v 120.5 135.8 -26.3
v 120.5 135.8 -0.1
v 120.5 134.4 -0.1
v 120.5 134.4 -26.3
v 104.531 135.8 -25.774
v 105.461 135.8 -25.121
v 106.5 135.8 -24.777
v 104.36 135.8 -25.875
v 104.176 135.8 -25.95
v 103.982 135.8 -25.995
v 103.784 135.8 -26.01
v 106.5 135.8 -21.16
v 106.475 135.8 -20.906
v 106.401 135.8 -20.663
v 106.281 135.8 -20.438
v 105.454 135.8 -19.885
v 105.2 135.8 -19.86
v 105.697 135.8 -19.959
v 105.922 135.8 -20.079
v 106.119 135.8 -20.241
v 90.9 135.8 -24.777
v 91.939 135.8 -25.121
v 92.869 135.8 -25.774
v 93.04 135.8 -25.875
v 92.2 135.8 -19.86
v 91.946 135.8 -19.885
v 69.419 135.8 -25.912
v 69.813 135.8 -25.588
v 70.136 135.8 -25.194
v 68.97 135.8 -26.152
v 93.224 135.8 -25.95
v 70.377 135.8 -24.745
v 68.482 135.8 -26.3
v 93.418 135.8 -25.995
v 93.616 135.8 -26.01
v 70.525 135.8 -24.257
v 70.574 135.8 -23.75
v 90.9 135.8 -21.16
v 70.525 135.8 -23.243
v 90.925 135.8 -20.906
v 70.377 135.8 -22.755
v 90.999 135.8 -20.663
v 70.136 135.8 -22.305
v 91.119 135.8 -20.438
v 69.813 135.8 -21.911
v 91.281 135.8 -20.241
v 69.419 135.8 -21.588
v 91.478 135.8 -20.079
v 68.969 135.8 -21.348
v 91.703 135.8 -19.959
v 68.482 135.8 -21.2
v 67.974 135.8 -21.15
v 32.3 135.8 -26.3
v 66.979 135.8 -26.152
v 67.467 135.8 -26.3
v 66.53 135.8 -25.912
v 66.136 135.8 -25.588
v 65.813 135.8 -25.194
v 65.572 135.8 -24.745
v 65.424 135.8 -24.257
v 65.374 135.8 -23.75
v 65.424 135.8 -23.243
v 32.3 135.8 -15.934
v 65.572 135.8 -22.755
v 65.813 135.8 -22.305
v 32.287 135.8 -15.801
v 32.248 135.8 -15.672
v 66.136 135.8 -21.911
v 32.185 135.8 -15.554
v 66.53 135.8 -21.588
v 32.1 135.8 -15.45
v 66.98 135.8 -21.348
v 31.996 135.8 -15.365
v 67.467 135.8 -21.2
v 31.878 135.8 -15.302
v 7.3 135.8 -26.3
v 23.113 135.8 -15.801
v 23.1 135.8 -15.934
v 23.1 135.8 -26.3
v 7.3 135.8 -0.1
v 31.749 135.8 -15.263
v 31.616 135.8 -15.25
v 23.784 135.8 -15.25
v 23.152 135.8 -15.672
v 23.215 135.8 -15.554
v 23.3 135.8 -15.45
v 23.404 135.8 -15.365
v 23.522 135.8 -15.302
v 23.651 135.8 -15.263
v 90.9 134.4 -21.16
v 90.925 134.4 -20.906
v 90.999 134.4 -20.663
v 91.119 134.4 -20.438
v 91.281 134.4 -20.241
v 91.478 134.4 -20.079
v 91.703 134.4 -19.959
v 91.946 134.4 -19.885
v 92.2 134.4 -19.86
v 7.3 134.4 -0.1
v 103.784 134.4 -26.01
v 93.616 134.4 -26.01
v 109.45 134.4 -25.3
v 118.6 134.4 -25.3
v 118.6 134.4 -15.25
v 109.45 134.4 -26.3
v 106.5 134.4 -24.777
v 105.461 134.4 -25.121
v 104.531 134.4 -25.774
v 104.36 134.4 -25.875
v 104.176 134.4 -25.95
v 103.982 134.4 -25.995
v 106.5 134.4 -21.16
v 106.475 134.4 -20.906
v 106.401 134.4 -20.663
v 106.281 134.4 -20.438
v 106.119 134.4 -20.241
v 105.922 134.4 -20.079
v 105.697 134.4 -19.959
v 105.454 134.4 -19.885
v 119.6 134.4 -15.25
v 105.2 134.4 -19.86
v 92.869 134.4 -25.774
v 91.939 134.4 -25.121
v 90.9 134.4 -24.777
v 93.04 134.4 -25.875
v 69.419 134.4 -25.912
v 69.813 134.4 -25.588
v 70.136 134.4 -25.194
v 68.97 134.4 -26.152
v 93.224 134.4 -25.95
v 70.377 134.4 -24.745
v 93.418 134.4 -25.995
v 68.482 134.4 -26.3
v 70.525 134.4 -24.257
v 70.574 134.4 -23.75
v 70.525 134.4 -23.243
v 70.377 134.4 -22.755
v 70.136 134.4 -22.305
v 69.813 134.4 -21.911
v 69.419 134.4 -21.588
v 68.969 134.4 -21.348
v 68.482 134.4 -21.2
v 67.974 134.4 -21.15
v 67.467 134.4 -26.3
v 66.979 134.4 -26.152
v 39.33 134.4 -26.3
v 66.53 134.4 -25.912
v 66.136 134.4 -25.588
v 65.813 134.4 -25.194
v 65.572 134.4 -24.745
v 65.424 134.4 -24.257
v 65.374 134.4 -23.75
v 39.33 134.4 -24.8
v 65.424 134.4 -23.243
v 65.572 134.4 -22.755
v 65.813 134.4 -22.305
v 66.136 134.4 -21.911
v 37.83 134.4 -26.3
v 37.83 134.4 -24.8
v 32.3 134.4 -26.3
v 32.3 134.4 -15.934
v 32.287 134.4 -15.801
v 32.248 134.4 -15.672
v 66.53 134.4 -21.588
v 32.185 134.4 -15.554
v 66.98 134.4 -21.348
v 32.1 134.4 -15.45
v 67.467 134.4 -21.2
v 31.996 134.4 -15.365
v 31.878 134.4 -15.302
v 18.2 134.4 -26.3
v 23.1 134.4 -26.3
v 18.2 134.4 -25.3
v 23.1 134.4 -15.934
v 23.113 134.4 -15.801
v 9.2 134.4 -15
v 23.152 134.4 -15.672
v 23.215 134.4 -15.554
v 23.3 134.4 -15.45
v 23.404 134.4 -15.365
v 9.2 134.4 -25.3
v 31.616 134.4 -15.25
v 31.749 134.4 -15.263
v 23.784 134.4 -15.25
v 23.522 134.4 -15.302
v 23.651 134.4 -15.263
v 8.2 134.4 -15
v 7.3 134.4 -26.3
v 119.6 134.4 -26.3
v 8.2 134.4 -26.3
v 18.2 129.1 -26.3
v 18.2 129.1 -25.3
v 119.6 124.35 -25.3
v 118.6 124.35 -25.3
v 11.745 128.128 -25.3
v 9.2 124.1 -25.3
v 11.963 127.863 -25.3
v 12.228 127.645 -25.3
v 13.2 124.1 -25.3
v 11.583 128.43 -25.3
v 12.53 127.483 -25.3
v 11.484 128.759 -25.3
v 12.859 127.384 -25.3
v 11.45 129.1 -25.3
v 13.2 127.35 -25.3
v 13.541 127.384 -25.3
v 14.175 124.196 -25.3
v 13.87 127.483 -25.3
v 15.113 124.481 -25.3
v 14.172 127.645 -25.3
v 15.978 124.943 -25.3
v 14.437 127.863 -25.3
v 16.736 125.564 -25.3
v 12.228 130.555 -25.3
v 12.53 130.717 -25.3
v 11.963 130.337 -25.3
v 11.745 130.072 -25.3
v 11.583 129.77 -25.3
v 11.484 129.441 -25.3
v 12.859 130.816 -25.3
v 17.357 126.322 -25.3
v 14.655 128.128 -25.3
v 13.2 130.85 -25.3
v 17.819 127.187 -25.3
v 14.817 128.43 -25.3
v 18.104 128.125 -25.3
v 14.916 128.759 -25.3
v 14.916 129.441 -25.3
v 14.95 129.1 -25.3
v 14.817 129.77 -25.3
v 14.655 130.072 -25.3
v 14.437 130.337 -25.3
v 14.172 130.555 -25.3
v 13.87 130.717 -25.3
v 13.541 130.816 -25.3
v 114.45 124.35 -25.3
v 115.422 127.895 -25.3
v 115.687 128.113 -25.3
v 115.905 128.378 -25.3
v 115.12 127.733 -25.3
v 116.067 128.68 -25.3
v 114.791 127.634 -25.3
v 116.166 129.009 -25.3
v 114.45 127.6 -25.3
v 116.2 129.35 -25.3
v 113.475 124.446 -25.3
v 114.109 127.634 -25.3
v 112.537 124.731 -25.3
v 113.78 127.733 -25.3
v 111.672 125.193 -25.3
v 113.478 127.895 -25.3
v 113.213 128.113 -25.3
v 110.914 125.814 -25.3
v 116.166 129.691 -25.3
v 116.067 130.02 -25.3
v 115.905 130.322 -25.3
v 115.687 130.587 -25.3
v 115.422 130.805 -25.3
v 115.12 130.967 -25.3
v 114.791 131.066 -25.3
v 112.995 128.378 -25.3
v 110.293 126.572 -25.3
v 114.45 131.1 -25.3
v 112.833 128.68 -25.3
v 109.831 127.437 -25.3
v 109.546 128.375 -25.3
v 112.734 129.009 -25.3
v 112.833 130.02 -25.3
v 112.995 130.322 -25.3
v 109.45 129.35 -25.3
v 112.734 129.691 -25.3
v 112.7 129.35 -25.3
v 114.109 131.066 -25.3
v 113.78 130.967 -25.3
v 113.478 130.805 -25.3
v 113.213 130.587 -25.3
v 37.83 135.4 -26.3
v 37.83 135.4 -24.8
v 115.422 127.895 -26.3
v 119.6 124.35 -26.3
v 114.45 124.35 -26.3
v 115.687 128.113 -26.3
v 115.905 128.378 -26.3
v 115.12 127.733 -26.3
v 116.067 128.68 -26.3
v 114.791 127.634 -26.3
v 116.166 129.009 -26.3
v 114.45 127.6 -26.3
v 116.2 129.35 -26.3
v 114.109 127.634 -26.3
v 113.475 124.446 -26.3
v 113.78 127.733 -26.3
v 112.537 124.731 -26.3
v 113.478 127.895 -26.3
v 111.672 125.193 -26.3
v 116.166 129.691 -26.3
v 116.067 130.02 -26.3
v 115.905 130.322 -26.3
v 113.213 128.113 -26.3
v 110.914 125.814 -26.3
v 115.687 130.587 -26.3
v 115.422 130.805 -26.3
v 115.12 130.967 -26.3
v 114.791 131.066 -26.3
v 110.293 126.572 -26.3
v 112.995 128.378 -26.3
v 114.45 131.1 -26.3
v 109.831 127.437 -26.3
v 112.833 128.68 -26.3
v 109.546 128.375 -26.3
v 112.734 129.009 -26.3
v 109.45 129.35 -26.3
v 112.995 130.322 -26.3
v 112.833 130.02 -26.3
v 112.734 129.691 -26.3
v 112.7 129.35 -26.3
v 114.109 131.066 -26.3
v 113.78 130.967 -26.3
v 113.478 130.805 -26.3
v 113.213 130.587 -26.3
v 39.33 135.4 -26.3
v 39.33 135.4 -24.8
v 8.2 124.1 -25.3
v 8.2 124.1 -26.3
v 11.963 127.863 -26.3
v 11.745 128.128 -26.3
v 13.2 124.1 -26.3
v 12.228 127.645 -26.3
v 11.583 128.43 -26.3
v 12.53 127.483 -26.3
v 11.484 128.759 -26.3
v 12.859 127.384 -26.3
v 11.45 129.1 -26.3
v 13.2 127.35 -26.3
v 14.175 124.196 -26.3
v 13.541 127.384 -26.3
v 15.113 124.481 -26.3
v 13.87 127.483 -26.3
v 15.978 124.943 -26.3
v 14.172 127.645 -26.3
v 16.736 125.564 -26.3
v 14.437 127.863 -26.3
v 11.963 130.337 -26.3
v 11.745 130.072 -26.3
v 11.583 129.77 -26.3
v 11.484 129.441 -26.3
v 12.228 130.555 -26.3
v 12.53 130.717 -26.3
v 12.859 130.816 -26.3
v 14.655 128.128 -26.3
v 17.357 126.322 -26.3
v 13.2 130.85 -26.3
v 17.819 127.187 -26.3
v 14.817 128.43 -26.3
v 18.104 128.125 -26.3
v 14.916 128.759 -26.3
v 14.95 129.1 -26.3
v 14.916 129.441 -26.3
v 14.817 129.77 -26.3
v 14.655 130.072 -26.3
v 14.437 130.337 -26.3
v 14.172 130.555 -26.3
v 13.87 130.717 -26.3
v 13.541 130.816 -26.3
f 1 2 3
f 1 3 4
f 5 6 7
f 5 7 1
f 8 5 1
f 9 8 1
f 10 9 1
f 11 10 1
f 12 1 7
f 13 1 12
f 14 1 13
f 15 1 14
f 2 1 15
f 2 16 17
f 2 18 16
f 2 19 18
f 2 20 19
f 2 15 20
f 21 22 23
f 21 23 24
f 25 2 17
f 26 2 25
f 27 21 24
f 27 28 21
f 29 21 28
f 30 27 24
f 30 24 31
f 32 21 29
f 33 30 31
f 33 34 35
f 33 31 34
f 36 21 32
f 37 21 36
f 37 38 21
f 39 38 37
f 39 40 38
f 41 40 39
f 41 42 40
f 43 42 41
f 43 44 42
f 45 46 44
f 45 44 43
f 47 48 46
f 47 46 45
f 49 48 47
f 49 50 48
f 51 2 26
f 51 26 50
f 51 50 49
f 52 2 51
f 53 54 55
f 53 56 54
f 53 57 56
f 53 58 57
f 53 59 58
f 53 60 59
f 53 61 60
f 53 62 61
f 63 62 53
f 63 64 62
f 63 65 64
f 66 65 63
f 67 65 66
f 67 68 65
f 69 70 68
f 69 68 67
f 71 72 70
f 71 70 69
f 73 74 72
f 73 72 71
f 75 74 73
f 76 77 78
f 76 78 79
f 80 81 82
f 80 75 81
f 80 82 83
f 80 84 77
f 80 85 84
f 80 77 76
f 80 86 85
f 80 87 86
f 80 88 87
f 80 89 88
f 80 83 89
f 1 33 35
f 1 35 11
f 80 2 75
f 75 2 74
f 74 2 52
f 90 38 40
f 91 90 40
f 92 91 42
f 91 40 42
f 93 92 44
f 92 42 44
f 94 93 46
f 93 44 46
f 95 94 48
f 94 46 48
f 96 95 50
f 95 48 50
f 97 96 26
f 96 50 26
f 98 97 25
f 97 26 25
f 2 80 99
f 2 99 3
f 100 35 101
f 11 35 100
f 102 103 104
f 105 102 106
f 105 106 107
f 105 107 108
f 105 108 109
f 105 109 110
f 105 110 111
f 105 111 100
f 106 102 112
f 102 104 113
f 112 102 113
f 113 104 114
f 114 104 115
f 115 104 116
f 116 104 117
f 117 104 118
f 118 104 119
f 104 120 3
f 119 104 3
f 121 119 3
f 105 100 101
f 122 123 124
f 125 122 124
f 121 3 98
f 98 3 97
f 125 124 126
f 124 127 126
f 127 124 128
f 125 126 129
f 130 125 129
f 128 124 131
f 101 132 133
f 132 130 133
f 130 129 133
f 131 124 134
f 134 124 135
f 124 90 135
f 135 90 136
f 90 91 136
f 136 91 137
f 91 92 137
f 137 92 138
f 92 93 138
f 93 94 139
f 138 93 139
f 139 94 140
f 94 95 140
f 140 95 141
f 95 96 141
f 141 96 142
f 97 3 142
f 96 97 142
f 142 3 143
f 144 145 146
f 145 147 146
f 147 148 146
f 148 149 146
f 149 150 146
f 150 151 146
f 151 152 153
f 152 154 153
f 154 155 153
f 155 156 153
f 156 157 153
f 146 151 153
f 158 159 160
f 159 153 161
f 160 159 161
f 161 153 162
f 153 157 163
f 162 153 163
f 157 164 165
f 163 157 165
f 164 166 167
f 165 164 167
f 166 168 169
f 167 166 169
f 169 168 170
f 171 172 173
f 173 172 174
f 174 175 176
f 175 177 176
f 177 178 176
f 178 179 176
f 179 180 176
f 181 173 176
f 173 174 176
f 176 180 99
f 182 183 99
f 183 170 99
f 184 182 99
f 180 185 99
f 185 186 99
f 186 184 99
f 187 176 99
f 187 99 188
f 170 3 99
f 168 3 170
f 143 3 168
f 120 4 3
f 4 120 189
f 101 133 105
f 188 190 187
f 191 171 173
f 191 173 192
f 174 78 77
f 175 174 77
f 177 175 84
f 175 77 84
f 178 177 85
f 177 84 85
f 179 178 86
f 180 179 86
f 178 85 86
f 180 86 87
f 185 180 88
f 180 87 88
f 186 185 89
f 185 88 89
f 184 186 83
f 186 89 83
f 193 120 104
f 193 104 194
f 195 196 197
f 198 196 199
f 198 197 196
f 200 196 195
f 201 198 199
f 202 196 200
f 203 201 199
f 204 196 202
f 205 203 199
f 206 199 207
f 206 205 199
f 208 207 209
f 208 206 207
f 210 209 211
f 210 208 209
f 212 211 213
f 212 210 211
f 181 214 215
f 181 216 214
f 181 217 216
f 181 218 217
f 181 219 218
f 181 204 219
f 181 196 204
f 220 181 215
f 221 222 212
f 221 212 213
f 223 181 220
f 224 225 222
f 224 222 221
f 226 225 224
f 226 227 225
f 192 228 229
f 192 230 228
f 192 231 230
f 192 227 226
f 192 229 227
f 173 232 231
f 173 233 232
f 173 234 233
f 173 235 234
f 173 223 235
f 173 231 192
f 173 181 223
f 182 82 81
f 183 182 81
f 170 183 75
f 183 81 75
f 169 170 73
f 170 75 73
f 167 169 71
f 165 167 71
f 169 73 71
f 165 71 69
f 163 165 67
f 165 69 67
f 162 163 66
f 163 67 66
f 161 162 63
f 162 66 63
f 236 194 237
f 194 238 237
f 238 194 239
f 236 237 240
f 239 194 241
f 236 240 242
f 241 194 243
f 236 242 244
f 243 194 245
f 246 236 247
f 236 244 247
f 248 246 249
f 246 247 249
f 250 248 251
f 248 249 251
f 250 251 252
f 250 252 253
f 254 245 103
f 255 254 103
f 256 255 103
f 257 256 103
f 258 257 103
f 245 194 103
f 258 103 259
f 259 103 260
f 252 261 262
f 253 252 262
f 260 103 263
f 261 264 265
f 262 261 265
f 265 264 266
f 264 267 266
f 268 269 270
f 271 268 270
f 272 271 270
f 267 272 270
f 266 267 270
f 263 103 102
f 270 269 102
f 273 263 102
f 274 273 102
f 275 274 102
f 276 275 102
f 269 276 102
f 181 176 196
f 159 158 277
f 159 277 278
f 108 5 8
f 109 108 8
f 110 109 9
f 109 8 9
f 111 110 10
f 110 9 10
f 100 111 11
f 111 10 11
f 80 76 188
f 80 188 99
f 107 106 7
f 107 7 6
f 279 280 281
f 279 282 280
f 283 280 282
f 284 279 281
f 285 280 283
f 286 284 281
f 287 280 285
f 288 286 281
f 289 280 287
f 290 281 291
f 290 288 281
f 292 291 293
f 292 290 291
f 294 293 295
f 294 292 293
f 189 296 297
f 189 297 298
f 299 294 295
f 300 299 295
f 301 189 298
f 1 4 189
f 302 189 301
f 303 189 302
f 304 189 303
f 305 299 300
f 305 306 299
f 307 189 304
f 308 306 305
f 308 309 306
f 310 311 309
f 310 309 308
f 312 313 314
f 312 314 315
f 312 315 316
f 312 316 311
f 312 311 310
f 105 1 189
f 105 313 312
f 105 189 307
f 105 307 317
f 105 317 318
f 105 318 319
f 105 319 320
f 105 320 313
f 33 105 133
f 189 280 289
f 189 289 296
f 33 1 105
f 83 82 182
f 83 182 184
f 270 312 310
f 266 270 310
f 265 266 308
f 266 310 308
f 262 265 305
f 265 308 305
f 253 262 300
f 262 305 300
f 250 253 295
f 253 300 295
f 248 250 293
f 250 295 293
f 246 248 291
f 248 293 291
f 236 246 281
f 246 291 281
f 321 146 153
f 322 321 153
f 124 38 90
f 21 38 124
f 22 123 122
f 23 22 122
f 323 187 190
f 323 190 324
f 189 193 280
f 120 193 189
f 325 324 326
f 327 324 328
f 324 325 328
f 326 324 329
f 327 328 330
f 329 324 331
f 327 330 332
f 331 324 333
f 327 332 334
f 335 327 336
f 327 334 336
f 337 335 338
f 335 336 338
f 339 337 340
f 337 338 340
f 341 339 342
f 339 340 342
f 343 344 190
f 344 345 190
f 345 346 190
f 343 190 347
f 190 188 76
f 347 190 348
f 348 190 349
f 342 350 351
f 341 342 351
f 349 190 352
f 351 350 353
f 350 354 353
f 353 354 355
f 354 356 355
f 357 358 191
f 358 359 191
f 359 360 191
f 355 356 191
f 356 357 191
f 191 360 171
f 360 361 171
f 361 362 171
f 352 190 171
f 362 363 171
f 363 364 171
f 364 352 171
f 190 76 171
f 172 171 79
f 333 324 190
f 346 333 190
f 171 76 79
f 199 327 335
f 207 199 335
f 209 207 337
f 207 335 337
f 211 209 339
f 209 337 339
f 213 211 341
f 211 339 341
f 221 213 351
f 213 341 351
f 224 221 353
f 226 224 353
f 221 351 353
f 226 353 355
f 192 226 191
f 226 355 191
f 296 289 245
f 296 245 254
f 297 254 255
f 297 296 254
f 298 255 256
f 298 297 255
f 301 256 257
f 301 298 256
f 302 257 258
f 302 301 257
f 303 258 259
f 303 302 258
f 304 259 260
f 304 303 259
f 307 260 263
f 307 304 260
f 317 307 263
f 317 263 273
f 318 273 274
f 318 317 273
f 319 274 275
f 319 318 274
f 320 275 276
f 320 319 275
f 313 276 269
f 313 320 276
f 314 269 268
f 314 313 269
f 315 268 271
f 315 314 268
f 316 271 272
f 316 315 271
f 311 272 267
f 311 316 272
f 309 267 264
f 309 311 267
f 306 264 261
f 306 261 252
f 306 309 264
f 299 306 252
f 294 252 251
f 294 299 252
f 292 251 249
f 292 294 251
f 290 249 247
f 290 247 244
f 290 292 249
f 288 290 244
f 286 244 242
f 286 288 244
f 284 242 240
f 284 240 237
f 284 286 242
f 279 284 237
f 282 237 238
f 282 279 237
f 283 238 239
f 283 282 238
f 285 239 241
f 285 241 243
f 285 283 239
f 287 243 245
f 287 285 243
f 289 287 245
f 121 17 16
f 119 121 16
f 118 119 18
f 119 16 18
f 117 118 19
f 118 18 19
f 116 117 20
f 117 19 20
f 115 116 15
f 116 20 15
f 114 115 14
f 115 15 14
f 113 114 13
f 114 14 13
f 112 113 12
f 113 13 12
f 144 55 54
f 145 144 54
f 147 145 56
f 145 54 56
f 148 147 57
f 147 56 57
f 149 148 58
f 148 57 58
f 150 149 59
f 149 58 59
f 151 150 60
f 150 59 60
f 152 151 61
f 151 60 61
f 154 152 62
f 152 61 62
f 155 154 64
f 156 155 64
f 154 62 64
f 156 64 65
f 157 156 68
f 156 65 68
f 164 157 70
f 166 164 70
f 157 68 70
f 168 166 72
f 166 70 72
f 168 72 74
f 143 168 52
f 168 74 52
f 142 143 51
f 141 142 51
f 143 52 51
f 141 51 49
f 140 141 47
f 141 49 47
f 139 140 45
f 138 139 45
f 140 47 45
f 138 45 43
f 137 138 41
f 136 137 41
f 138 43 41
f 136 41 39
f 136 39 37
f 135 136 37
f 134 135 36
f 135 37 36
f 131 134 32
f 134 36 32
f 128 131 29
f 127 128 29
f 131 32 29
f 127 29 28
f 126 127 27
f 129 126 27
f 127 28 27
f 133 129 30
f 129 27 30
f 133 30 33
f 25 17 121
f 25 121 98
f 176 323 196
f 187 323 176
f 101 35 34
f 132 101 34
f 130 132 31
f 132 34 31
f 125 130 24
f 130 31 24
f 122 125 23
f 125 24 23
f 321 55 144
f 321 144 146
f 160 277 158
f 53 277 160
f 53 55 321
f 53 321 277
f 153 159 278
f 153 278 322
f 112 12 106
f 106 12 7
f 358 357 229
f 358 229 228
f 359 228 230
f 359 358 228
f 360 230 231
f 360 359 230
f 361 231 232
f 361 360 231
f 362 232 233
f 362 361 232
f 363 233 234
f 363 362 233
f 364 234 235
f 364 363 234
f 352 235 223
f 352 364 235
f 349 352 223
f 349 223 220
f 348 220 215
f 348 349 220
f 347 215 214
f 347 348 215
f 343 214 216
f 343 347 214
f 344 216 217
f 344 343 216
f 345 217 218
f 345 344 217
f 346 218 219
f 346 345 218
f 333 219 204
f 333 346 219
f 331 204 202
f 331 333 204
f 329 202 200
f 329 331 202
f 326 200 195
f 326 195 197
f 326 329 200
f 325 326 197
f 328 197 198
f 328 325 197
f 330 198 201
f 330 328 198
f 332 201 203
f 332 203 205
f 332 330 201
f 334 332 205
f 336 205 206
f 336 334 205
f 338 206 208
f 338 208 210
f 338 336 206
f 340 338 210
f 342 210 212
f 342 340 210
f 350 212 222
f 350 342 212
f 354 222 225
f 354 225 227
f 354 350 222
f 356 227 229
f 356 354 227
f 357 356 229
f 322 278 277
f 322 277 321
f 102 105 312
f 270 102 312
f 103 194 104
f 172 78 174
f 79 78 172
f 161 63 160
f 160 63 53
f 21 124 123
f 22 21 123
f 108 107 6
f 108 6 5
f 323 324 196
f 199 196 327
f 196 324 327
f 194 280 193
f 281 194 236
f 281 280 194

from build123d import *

# Parameters (mm, degrees)
PAD028_DEPTH    = 1.4
SKETCH048_R     = 1.75
PAD029_DEPTH    = 1
PAD030_DEPTH    = 1
PAD031_DEPTH    = 1
SKETCH181_W     = 1.5
SKETCH181_H     = 1.5
POCKET062_DEPTH = 1


with BuildPart() as part:
    # Sketch047 (on Face725 of Binder021) → Pad028 (new body)
    with BuildSketch(Plane(origin=(0, 135.8, 0), x_dir=(-1, 0, 0), z_dir=(0, 1, 0))):
        with BuildLine():
            Line((-120.499982, -0.1), (-120.499982, -26.3))
            Line((-120.499982, -26.3), (-68.48194, -26.3))
            ThreePointArc((-67.46705, -26.3), (-67.974495, -21.15), (-68.48194, -26.3))
            Line((-67.46705, -26.3), (-32.299995, -26.3))
            Line((-32.299995, -15.934266), (-32.299995, -26.3))
            ThreePointArc((-31.615729, -15.25), (-32.099578, -15.450417), (-32.299995, -15.934266))
            Line((-31.615729, -15.25), (-23.784261, -15.25))
            ThreePointArc((-23.099995, -15.934266), (-23.300412, -15.450417), (-23.784261, -15.25))
            Line((-23.099995, -15.934266), (-23.099995, -26.3))
            Line((-7.299995, -26.3), (-23.099995, -26.3))
            Line((-7.299995, -26.3), (-7.299995, -0.1))
            Line((-7.299995, -0.1), (-120.499982, -0.1))
        make_face()
        with BuildLine():
            Line((-105.199995, -19.86), (-92.199994, -19.86))
            ThreePointArc((-90.899995, -21.16), (-91.280756, -20.240762), (-92.199994, -19.86))
            Line((-90.899995, -21.16), (-90.899995, -24.776619))
            Line((-90.899995, -24.776619), (-91.938732, -25.120886))
            Line((-91.938732, -25.120886), (-92.869018, -25.773985))
            ThreePointArc((-93.61597, -26.01), (-93.224294, -25.949593), (-92.869018, -25.773985))
            Line((-93.61597, -26.01), (-103.78402, -26.01))
            ThreePointArc((-104.530977, -25.773981), (-104.175699, -25.949592), (-103.78402, -26.01))
            Line((-105.461258, -25.120886), (-104.530977, -25.773981))
            Line((-106.499995, -24.776619), (-105.461258, -25.120886))
            Line((-106.499995, -21.16), (-106.499995, -24.776619))
            ThreePointArc((-105.199995, -19.86), (-106.119234, -20.240761), (-106.499995, -21.16))
        make_face(mode=Mode.SUBTRACT)
    extrude(amount=-PAD028_DEPTH)

    # Sketch048 (on Face5 of Binder022) → Pad029 (join)
    with BuildSketch(Plane.XY.offset(-26.3)):
        with BuildLine():
            Line((18.199995, 134.4), (8.199995, 134.4))
            Line((8.199995, 134.4), (8.199995, 124.1))
            Line((8.199995, 124.1), (13.199995, 124.1))
            ThreePointArc((13.199995, 124.1), (16.735529, 125.564466), (18.199995, 129.1))
            Line((18.199995, 134.4), (18.199995, 129.1))
        make_face()
        with Locations((13.199995, 129.1)):
            Circle(SKETCH048_R, mode=Mode.SUBTRACT)
        with BuildLine():
            Line((109.449995, 134.4), (119.599982, 134.4))
            Line((119.599982, 134.4), (119.599982, 124.35))
            Line((119.599982, 124.35), (114.449995, 124.35))
            ThreePointArc((109.449995, 129.35), (110.914461, 125.814466), (114.449995, 124.35))
            Line((109.449995, 134.4), (109.449995, 129.35))
        make_face()
        with Locations((114.449995, 129.35)):
            Circle(SKETCH048_R, mode=Mode.SUBTRACT)
    extrude(amount=PAD029_DEPTH)

    # Sketch049 (on Face25 of Pad029) → Pad030 (join)
    with BuildSketch(Plane(origin=(8.199995, 0, 0), x_dir=(0, -1, 0), z_dir=(-1, 0, 0))):
        Polygon((-134.4, -25.3), (-124.1, -25.3), (-134.4, -15), align=None)
    extrude(amount=-PAD030_DEPTH)

    # Sketch050 (on Face36 of Pad030) → Pad031 (join)
    with BuildSketch(Plane.YZ.offset(119.599982)):
        Polygon((124.35, -25.3), (134.4, -25.3), (134.4, -15.25), align=None)
    extrude(amount=-PAD031_DEPTH)

    # Sketch181 (on Face5 of Clone006) → Pocket062 (cut)
    with BuildSketch(Plane.XZ.offset(-134.4)):
        with Locations((38.579995, -25.55)):
            Rectangle(SKETCH181_W, SKETCH181_H)
    extrude(amount=-POCKET062_DEPTH, mode=Mode.SUBTRACT)


solid = part.part
